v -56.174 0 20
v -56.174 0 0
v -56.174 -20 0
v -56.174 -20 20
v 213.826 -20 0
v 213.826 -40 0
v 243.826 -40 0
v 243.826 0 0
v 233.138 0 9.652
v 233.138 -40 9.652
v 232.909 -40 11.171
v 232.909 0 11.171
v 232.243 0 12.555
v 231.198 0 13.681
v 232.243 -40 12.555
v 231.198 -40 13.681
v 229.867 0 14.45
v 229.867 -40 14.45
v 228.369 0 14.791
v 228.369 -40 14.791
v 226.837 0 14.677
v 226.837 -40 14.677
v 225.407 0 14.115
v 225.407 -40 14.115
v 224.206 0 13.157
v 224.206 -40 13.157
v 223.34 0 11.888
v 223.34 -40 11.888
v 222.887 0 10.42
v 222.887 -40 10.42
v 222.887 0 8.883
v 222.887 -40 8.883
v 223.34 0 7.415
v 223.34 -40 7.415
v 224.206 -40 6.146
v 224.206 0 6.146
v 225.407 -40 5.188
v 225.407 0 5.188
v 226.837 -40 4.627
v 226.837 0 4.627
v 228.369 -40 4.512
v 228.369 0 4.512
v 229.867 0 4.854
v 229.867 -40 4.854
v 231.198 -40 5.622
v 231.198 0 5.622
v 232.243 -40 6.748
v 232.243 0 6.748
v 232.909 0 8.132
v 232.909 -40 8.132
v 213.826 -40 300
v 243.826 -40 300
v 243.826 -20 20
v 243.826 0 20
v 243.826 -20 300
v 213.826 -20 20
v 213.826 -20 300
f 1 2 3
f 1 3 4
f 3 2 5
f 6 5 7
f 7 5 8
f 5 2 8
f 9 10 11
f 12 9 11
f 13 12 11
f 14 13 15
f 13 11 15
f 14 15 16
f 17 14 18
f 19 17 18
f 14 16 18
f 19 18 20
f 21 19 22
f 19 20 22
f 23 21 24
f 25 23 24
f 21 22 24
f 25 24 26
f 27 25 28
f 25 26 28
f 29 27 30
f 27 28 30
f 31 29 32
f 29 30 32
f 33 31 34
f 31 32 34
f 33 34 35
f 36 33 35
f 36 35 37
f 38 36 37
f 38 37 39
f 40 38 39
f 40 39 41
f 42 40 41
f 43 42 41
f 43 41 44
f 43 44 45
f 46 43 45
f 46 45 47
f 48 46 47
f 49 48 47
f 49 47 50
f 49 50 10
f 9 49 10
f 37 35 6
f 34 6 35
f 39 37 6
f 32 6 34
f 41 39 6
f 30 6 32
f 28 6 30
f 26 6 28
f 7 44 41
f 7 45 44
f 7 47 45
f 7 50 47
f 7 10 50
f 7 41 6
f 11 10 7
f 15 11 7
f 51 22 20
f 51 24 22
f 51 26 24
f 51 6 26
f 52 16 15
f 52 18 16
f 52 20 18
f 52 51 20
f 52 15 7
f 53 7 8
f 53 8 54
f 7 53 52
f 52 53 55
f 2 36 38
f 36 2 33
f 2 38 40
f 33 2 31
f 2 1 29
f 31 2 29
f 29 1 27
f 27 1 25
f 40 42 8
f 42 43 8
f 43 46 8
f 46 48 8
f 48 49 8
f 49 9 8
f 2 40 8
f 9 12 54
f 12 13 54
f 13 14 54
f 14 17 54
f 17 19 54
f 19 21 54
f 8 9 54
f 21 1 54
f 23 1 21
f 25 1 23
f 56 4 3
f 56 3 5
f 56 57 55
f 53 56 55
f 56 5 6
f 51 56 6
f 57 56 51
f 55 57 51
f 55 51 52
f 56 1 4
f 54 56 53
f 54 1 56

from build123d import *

# Parameters (mm, degrees)
F0_W     = 300
F0_H     = 20
F1_DEPTH = 20
F2_R     = 5.1542561855
F3_DEPTH = 20.001
F4_W     = 30
F4_H     = 300
F5_DEPTH = 20
F6_R     = 5.1542561855
F7_DEPTH = 25


with BuildPart() as f1:
    # F0 (on Front) → F1 (new body)
    with BuildSketch(Plane.XZ):
        with Locations((93.8255012718, 10)):
            Rectangle(F0_W, F0_H)
    extrude(amount=F1_DEPTH)

    # F2 (on face) → F3 (cut, through all)
    with BuildSketch(Plane.XZ.offset(20)):
        with Locations((227.9840409756, 9.651648812)):
            Circle(F2_R)
    extrude(amount=-F3_DEPTH, mode=Mode.SUBTRACT)

    # F4 (on face) → F5 (join)
    with BuildSketch(Plane.XZ.offset(20)):
        with Locations((228.8255012718, 150)):
            Rectangle(F4_W, F4_H)
    extrude(amount=F5_DEPTH)

    # F6 (on face) → F7 (cut)
    with BuildSketch(Plane.XZ.offset(40)):
        with Locations((227.9840409756, 9.651648812)):
            Circle(F6_R)
    extrude(amount=-F7_DEPTH, mode=Mode.SUBTRACT)


solid = f1.part
